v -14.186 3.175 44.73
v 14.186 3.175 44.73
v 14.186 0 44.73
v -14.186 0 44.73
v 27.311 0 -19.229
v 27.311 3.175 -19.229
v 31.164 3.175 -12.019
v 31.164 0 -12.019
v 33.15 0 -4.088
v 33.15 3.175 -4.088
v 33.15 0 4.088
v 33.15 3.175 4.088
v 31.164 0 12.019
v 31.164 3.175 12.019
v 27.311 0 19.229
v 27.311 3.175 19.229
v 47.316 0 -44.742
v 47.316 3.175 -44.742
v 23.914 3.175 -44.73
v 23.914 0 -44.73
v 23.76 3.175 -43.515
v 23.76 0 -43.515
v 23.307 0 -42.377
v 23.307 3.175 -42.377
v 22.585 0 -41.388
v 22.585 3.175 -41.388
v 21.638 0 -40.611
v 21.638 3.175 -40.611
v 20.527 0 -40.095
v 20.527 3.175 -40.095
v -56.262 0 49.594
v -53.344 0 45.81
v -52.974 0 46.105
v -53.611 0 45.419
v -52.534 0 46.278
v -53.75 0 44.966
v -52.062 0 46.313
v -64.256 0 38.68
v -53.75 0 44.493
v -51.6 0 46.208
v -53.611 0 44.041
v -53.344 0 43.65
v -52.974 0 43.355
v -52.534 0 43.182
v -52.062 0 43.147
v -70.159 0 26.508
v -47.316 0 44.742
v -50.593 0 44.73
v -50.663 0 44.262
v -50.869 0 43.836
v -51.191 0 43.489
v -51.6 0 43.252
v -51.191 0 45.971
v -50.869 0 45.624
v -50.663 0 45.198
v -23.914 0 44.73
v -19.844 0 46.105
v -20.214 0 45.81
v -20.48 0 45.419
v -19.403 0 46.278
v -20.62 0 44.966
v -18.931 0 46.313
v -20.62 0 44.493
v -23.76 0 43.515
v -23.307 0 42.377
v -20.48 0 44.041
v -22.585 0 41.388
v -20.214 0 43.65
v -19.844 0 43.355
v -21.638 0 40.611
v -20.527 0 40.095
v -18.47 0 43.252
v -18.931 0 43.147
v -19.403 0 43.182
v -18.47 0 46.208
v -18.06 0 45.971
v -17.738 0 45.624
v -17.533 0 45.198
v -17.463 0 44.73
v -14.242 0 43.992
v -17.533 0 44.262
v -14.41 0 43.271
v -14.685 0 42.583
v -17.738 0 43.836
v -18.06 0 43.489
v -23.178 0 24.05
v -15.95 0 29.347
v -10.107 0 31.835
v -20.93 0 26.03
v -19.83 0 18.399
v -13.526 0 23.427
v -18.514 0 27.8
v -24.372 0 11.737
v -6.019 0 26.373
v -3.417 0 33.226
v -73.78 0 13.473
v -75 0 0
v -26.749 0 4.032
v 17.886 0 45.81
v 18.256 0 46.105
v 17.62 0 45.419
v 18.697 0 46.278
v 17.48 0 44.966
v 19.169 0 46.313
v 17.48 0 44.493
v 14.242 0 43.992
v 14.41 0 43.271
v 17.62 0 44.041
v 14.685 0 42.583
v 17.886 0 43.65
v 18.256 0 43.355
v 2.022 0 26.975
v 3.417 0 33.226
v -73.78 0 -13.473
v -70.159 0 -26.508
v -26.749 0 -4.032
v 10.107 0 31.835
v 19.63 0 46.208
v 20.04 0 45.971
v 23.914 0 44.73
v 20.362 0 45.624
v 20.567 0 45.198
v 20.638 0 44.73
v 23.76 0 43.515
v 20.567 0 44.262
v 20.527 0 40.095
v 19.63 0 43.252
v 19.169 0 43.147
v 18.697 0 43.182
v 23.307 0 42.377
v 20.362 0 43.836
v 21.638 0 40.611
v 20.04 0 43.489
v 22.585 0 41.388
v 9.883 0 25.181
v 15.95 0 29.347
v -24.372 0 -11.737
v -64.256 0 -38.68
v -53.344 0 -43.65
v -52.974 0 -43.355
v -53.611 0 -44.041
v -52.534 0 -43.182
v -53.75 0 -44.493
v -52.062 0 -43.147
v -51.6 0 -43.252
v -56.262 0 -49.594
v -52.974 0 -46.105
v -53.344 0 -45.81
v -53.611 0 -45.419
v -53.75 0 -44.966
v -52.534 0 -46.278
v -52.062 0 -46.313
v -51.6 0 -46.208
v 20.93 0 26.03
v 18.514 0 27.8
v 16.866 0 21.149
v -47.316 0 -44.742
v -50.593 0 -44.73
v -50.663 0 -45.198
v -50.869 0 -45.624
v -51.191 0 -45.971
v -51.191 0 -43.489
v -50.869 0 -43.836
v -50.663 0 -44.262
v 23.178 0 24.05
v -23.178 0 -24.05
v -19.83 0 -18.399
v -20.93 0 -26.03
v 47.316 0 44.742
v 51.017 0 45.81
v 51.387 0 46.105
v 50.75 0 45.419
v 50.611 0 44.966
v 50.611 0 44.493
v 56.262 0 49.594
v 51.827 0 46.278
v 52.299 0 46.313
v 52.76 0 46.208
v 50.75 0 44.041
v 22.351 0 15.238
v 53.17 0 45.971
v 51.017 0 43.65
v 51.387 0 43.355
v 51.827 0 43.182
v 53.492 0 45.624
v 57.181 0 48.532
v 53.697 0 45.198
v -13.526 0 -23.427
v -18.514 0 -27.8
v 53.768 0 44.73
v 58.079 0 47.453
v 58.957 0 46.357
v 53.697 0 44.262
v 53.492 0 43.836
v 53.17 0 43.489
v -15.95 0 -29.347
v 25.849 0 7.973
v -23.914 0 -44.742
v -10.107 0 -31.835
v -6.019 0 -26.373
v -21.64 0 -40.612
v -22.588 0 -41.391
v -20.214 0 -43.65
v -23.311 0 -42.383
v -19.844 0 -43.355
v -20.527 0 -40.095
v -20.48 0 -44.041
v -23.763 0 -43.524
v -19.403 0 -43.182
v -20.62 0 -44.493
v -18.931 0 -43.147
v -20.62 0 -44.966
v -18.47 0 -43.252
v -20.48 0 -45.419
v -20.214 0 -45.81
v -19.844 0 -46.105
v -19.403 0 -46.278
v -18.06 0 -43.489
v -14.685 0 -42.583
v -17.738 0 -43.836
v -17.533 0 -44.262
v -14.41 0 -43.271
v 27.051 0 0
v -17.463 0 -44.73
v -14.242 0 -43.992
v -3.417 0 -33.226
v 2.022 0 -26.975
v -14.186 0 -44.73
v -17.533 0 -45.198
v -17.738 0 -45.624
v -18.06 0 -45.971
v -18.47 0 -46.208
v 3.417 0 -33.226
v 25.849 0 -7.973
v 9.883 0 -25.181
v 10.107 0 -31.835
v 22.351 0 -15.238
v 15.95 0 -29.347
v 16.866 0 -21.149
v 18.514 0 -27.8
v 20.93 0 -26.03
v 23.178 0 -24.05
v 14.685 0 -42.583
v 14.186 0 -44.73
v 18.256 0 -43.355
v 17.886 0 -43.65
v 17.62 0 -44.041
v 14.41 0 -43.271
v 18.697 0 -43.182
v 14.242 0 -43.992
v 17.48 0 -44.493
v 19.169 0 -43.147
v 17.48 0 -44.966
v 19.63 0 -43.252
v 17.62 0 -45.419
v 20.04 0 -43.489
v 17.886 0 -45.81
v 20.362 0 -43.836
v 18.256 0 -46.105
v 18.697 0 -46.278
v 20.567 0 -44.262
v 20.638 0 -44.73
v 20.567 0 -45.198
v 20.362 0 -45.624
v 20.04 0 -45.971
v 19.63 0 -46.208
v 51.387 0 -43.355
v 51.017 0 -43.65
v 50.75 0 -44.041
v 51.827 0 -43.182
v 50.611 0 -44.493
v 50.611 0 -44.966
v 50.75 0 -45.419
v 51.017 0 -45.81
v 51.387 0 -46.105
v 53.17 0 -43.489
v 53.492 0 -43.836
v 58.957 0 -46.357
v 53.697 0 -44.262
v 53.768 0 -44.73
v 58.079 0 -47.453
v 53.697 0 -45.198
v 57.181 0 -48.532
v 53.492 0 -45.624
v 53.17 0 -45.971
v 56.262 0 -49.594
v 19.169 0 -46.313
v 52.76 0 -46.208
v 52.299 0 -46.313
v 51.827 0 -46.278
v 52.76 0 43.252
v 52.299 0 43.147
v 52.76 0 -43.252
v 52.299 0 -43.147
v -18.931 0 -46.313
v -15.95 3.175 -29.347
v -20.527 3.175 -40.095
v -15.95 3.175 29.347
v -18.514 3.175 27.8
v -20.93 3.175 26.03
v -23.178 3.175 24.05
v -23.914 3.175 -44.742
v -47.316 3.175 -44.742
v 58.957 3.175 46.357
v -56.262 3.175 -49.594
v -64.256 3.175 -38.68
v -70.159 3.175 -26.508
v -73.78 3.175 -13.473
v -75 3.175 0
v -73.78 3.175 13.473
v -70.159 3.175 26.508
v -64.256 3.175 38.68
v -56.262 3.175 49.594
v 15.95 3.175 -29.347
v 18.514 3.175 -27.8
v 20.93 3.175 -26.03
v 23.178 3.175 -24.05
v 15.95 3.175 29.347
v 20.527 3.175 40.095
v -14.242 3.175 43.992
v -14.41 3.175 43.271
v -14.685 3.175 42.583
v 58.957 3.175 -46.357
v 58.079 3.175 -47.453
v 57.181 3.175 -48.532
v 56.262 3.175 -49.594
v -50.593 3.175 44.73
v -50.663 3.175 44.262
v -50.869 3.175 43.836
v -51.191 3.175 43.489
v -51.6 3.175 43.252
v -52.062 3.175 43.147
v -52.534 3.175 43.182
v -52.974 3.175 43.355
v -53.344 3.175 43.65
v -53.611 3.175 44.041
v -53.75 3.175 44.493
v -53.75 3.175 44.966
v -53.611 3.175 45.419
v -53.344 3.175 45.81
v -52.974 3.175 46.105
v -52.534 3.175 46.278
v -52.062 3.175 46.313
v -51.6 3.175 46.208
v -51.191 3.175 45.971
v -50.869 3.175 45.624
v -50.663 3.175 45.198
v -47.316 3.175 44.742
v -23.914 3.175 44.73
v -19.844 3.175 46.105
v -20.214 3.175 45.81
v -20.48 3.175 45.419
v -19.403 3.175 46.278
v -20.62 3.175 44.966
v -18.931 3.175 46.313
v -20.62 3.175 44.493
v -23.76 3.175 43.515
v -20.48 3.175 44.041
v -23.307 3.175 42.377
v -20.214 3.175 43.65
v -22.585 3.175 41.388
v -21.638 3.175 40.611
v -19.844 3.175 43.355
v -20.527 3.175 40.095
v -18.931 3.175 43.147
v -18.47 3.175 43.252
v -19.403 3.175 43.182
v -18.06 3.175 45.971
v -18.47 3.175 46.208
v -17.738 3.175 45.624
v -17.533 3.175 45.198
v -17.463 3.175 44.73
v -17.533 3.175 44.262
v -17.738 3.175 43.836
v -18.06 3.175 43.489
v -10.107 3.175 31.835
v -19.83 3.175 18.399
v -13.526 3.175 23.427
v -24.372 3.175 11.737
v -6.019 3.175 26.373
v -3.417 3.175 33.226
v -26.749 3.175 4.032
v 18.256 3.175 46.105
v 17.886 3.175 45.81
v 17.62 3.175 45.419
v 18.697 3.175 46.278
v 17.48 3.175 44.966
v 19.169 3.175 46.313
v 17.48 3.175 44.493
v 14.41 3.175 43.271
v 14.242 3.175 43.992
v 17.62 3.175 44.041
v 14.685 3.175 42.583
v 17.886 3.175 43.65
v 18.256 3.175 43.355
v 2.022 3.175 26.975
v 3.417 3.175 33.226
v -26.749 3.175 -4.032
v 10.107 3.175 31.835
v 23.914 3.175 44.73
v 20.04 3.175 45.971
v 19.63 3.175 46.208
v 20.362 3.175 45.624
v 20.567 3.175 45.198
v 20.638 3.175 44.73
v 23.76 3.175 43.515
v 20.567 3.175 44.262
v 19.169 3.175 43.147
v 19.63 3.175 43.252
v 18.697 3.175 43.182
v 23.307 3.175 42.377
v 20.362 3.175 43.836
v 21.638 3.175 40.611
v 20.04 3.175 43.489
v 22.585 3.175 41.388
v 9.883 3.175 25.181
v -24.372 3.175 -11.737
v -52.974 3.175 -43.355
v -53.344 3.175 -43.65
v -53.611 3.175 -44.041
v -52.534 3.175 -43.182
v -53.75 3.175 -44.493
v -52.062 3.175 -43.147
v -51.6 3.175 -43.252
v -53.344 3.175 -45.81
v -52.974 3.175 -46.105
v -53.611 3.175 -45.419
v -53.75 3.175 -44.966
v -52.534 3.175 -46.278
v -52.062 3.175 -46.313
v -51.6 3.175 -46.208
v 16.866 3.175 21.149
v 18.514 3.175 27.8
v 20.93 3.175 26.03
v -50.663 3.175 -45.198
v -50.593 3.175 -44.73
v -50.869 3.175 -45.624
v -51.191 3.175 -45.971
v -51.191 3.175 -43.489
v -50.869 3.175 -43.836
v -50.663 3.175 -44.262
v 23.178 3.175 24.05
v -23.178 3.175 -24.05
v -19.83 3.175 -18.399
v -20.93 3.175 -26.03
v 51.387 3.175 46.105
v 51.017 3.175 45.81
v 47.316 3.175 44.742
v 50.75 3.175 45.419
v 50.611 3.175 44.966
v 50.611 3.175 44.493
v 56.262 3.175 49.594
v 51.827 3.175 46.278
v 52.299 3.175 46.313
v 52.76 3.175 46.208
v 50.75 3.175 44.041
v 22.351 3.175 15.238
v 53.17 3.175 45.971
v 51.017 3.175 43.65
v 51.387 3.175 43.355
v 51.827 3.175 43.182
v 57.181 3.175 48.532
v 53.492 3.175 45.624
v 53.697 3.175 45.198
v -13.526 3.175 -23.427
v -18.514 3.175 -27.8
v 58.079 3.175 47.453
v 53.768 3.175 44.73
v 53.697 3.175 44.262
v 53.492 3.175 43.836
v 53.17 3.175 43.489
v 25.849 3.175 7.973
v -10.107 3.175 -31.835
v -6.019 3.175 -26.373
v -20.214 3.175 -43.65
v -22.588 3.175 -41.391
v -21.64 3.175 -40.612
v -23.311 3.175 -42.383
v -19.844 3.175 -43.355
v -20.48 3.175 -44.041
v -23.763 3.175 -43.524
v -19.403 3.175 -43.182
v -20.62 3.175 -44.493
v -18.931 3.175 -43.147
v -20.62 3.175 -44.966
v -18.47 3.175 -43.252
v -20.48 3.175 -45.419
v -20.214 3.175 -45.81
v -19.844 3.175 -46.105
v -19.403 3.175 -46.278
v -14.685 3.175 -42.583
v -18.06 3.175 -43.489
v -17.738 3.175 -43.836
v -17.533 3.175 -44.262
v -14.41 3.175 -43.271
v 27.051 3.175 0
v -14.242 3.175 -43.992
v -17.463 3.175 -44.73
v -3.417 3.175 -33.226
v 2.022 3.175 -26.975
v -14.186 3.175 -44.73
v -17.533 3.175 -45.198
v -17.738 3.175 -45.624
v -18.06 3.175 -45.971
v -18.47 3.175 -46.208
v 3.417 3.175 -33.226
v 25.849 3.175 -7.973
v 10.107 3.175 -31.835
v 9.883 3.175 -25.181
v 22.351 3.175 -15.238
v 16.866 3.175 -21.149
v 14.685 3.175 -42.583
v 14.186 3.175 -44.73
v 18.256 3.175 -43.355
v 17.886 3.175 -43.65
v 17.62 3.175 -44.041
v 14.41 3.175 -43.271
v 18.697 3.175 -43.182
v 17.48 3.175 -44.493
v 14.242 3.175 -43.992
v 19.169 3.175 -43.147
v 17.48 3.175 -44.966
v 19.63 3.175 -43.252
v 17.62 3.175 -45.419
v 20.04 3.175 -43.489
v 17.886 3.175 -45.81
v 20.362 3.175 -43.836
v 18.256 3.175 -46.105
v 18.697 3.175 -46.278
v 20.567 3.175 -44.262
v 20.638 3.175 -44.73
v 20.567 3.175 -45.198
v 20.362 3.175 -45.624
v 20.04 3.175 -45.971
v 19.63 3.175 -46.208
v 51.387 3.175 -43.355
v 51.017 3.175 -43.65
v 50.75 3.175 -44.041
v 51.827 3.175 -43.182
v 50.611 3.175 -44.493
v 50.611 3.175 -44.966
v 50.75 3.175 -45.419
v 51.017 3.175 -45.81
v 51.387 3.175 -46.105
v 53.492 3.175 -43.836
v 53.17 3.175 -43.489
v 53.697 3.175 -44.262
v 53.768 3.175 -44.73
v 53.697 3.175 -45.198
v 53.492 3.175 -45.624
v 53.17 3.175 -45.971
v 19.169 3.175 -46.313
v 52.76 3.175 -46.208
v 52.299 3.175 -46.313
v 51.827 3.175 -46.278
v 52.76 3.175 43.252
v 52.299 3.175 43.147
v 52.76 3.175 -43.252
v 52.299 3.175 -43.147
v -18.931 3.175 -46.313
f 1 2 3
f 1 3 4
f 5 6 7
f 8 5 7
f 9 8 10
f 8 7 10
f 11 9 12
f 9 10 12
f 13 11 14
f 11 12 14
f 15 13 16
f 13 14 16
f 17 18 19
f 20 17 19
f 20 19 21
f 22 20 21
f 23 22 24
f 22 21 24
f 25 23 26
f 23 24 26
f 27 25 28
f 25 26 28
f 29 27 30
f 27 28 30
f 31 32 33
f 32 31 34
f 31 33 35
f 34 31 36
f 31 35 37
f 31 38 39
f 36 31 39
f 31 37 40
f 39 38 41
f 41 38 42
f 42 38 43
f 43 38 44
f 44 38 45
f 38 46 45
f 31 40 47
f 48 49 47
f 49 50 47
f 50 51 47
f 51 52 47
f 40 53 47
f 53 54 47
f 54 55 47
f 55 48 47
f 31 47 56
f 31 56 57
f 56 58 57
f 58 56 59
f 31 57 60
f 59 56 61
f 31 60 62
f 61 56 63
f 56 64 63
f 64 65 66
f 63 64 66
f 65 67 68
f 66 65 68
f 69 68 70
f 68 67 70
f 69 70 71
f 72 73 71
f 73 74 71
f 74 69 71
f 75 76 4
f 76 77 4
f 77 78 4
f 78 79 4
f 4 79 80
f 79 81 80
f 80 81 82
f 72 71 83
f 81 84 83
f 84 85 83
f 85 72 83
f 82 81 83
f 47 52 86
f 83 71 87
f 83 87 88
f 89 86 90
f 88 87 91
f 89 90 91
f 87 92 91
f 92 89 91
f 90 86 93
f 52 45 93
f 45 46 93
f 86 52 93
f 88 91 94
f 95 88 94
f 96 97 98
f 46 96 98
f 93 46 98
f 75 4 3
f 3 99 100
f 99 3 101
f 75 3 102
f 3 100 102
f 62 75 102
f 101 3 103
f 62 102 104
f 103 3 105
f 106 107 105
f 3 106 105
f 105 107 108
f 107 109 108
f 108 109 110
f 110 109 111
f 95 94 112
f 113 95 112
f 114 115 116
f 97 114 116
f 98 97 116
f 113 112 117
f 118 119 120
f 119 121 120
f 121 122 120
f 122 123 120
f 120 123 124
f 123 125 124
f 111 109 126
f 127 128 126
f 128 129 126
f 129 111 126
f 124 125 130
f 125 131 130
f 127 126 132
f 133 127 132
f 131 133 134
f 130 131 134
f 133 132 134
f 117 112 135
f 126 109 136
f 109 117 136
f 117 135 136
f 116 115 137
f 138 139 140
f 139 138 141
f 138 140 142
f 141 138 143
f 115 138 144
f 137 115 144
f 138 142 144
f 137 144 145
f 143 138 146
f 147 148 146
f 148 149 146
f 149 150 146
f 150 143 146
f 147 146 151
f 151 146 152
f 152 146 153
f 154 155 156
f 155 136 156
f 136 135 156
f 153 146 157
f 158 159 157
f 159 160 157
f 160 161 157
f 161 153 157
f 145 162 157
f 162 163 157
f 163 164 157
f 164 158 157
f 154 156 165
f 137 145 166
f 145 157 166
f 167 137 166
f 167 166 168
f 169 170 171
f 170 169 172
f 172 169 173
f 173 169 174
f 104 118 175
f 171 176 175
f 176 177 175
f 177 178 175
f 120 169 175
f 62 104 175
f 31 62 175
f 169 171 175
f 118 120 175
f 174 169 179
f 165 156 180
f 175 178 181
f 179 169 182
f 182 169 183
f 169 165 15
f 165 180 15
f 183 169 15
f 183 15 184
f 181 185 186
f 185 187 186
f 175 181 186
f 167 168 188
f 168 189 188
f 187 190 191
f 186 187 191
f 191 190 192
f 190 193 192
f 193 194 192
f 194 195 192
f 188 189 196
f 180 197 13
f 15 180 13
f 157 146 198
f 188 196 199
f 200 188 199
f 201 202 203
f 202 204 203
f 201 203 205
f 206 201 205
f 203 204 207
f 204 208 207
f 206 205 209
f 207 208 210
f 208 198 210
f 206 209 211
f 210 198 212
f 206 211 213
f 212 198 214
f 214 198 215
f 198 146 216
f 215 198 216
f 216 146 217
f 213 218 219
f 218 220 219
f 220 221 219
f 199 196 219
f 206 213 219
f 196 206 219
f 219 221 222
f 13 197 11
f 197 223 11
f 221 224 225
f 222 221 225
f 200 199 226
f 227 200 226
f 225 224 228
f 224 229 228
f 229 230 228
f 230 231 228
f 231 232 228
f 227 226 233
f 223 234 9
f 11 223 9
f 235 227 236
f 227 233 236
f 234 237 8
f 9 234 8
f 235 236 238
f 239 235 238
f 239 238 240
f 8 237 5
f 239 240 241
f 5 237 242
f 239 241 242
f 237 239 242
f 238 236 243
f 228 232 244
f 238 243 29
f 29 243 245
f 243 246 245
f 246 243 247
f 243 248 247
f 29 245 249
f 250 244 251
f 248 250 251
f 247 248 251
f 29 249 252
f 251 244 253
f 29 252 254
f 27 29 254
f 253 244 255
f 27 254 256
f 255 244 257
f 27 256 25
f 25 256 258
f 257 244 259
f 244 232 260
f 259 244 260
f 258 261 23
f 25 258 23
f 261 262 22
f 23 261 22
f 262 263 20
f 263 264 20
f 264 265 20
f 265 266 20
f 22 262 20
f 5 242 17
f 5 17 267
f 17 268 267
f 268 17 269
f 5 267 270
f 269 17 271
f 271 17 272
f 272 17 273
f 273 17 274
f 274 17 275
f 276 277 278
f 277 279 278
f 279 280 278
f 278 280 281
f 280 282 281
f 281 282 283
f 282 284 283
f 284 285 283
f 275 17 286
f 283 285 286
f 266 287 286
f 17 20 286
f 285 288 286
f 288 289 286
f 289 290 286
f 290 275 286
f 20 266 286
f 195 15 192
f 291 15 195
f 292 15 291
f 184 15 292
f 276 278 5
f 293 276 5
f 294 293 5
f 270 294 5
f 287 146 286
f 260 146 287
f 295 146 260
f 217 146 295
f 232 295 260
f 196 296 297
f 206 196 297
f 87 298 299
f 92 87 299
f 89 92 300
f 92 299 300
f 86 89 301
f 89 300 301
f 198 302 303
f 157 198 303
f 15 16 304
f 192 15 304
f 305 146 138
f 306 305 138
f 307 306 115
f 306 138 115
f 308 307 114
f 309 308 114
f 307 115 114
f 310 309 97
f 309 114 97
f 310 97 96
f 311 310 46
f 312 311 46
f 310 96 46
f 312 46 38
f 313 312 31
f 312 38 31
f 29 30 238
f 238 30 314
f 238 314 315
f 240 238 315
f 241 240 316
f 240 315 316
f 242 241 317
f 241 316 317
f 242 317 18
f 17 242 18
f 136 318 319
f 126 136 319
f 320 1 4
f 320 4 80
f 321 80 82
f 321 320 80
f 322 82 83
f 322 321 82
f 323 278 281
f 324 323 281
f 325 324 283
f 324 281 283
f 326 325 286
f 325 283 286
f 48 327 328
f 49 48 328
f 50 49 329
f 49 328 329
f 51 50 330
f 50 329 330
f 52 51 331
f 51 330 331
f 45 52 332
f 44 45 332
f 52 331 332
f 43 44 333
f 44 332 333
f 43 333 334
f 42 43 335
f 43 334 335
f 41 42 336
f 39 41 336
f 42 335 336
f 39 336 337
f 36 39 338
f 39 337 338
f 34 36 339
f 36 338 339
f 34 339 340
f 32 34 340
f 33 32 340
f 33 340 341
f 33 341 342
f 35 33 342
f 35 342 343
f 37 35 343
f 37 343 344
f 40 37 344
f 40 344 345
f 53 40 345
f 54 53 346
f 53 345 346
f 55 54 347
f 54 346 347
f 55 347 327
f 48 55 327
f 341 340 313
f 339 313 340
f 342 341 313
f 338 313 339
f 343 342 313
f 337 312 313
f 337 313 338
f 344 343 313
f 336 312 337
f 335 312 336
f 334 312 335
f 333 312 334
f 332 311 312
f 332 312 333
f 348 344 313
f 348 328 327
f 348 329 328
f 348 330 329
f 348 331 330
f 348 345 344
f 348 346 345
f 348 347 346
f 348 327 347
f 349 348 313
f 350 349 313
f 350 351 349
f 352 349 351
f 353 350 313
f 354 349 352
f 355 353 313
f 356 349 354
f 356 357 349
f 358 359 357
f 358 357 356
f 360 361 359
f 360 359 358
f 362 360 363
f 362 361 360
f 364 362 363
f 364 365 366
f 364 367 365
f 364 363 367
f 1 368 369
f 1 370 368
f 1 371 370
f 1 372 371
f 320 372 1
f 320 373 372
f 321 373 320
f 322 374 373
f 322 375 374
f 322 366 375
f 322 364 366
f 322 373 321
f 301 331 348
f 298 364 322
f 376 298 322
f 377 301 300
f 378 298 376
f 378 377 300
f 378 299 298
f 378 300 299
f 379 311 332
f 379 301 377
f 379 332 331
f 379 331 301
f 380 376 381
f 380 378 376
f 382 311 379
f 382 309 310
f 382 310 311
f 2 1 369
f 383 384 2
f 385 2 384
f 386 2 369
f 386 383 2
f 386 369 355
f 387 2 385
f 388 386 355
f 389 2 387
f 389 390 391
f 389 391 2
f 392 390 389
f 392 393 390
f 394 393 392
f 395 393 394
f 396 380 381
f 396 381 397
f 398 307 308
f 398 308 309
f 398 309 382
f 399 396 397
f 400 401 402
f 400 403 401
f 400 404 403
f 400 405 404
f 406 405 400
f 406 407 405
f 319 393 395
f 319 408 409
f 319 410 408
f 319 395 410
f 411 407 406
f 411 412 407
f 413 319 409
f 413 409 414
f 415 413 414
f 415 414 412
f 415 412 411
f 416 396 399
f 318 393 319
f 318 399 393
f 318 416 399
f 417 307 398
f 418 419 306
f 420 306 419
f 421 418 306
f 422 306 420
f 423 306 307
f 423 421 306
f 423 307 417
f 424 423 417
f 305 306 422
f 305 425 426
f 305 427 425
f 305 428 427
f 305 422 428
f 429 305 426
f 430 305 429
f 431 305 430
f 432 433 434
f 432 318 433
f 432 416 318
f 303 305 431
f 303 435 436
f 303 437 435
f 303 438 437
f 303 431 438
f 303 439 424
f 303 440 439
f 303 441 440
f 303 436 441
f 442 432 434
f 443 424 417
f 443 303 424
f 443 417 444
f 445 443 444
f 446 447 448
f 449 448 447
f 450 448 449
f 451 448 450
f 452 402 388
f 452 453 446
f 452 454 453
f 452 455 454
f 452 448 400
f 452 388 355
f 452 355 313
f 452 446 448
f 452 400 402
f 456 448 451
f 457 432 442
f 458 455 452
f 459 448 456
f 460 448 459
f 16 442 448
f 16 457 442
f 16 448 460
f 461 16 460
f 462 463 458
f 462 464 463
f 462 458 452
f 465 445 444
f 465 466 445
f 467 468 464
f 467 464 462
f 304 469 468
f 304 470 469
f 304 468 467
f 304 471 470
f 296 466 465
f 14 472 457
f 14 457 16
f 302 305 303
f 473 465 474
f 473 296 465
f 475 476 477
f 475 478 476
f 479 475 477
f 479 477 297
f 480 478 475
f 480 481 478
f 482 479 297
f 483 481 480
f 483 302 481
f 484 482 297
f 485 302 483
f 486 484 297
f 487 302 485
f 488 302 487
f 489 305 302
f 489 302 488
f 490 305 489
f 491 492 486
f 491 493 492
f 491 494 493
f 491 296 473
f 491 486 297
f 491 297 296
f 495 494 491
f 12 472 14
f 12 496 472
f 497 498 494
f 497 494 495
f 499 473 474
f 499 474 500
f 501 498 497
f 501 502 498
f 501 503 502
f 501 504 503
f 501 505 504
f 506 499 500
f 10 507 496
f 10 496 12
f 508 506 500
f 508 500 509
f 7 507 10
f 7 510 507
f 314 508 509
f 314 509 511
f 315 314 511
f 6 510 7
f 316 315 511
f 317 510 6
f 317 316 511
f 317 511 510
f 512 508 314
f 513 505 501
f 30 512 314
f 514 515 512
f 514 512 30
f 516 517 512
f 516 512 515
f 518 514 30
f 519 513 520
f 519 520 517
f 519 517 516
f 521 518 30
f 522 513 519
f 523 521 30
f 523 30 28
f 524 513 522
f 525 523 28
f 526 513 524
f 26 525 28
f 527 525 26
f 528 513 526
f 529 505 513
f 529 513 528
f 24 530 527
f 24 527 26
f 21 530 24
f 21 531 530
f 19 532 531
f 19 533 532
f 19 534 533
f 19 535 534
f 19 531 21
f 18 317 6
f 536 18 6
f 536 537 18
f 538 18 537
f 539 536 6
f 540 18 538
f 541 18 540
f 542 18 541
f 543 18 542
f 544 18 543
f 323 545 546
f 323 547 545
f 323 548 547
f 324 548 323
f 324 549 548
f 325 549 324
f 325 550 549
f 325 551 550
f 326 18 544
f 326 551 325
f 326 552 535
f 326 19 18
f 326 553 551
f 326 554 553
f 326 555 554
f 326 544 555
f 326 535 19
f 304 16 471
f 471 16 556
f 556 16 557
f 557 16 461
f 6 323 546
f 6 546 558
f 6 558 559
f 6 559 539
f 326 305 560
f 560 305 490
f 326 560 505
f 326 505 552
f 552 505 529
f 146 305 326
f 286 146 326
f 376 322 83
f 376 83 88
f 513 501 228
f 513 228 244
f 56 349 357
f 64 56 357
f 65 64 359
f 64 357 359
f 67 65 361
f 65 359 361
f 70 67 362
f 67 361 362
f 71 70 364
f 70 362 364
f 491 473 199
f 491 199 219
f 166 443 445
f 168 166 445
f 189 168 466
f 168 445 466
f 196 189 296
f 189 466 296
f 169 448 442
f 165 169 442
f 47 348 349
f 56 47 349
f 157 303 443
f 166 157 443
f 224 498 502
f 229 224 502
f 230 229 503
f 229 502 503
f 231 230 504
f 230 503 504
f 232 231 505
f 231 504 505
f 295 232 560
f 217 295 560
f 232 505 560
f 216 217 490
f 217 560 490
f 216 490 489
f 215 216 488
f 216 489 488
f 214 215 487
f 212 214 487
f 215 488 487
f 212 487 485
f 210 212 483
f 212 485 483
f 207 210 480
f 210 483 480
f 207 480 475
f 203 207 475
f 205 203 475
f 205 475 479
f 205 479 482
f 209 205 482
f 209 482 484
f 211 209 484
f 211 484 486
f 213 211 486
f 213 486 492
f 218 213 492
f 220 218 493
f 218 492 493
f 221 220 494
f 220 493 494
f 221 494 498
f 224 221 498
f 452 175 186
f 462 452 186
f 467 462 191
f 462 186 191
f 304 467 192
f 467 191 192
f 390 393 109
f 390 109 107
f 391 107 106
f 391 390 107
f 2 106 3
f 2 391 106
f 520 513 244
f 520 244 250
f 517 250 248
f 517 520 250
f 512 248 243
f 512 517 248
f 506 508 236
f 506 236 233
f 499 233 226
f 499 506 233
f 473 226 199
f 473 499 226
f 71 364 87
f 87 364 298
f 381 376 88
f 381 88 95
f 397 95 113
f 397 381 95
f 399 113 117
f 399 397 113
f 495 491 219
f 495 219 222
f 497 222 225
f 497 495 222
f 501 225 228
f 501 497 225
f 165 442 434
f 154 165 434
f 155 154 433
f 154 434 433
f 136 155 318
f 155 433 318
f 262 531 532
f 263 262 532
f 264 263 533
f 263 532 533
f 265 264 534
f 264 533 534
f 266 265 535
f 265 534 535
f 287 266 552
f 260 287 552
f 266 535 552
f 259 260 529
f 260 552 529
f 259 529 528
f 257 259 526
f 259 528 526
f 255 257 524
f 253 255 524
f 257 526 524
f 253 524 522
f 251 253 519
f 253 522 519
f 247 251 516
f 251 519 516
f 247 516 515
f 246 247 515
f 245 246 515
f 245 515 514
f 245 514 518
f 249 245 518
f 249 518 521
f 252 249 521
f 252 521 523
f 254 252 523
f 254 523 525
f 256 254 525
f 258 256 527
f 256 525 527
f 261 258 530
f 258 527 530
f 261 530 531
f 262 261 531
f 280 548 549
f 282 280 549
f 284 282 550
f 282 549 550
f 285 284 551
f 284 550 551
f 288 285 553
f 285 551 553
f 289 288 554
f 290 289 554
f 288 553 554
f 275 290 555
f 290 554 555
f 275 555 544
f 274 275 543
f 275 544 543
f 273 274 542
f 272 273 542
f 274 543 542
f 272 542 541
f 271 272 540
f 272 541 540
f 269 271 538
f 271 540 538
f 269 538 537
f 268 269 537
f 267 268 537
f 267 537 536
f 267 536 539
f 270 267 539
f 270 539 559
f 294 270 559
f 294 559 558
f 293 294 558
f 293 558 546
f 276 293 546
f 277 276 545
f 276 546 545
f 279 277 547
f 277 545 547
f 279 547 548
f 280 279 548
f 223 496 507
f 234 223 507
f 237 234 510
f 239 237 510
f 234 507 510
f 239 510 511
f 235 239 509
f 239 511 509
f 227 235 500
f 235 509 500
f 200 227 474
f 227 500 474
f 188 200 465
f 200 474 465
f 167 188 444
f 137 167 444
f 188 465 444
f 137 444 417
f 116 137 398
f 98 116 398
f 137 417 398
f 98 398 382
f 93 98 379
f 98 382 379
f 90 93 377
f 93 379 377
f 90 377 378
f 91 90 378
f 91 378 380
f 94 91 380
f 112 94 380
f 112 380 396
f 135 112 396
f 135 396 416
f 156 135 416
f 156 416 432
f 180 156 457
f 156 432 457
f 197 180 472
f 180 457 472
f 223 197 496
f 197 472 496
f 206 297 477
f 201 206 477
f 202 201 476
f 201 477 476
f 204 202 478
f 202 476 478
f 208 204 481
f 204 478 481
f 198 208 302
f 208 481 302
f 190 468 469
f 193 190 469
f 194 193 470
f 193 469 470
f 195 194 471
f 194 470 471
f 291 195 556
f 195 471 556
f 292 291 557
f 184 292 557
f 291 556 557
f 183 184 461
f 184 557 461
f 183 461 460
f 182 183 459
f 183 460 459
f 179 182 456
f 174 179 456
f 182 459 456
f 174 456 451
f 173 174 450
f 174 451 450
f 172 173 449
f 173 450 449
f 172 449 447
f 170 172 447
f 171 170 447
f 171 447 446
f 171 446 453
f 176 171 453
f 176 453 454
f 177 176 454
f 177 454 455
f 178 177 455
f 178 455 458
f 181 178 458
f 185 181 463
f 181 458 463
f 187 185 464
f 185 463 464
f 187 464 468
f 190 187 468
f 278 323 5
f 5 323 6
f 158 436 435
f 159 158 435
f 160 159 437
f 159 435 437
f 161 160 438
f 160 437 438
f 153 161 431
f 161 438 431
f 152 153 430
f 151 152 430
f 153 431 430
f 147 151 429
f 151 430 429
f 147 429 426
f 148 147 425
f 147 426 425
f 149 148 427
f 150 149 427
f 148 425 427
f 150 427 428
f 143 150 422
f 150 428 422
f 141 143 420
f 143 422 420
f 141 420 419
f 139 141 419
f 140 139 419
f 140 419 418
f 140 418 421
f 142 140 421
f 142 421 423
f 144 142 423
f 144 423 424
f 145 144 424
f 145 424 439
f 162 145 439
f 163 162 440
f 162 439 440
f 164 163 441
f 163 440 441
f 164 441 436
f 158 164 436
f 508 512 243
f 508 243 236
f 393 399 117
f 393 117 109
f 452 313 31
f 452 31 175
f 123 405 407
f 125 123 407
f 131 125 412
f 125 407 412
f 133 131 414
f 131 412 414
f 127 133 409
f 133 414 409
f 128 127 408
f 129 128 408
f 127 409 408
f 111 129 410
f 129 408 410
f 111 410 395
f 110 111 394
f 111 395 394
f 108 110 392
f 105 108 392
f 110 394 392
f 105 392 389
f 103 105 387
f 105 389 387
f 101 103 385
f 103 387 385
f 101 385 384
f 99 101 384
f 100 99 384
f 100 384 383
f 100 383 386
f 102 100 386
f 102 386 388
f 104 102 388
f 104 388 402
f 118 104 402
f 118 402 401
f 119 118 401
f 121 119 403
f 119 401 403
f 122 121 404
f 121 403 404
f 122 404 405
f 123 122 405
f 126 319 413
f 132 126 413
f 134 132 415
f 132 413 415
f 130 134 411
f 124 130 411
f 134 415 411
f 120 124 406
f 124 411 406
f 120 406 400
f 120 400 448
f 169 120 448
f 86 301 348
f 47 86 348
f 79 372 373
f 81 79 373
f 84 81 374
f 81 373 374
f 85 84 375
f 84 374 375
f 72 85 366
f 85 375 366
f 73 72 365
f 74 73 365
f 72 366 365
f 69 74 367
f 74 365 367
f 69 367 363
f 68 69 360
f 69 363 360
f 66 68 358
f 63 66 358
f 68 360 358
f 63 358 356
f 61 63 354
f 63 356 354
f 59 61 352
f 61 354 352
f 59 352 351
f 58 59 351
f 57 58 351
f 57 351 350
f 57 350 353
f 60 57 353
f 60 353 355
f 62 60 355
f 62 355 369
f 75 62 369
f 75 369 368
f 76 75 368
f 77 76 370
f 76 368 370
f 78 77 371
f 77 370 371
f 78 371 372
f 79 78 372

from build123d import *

# Parameters (mm, degrees)
SKETCH1_R           = 75
BOSS_EXTRUDE1_DEPTH = 3.175
CUT_EXTRUDE1_DEPTH  = 3.175
SKETCH3_R           = 1.5875
CUT_EXTRUDE2_DEPTH  = 3.175
SKETCH4_R           = 27.051
CUT_EXTRUDE3_DEPTH  = 3.175
CUT_EXTRUDE4_DEPTH  = 3.175


with BuildPart() as part:
    # Sketch1 → Boss-Extrude1 (new body)
    with BuildSketch(Plane(origin=(0, 0, 0), x_dir=(1, 0, 0), z_dir=(0, 1, 0))):
        Circle(SKETCH1_R)
    extrude(amount=BOSS_EXTRUDE1_DEPTH)

    # Sketch2 → Cut-Extrude1 (cut)
    with BuildSketch(Plane(origin=(0, 3.175, 0), x_dir=(1, 0, 0), z_dir=(0, 1, 0))):
        with BuildLine():
            Line((-56.262005909, -49.594220339), (56.262005909, -49.594220339))
            ThreePointArc((56.262005909, -49.594220339), (0, -75), (-56.262005909, -49.594220339))
        make_face()
        with BuildLine():
            Line((-56.262005909, 49.594220339), (56.262005909, 49.594220339))
            ThreePointArc((56.262005909, 49.594220339), (0, 75), (-56.262005909, 49.594220339))
        make_face()
    extrude(amount=-CUT_EXTRUDE1_DEPTH, mode=Mode.SUBTRACT)

    # Sketch3 → Cut-Extrude2 (cut)
    with BuildSketch(Plane(origin=(0, 3.175, 0), x_dir=(1, 0, 0), z_dir=(0, 1, 0))):
        with Locations((-52.180304588, 44.729838125)):
            Circle(SKETCH3_R)
        with Locations((-19.05, 44.729838125)):
            Circle(SKETCH3_R)
        with Locations((19.05, 44.729838125)):
            Circle(SKETCH3_R)
        with Locations((52.180304588, 44.729838125)):
            Circle(SKETCH3_R)
        with Locations((52.180304588, -44.729838125)):
            Circle(SKETCH3_R)
        with Locations((19.05, -44.729838125)):
            Circle(SKETCH3_R)
        with Locations((-19.05, -44.729838125)):
            Circle(SKETCH3_R)
        with Locations((-52.180304588, -44.729838125)):
            Circle(SKETCH3_R)
    extrude(amount=-CUT_EXTRUDE2_DEPTH, mode=Mode.SUBTRACT)

    # Sketch4 → Cut-Extrude3 (cut)
    with BuildSketch(Plane(origin=(0, 3.175, 0), x_dir=(1, 0, 0), z_dir=(0, 1, 0))):
        with BuildLine():
            Line((-47.315937317, 44.741895283), (-23.177806764, 24.050282215))
            ThreePointArc((-23.177806764, 24.050282215), (-19.742091457, 26.942097653), (-15.949506316, 29.346891646))
            Line((-15.949506316, 29.346891646), (-20.527078848, 40.095137229))
            ThreePointArc((-20.527078848, 40.095137229), (-22.980849122, 41.864416778), (-23.914367271, 44.741895283))
            Line((-23.914367271, 44.741895283), (-47.315937317, 44.741895283))
        make_face()
        with BuildLine():
            ThreePointArc((10.107278818, 31.835039122), (0, 33.401), (-10.107278818, 31.835039122))
            Line((-10.107278818, 31.835039122), (-14.68485135, 42.583284705))
            ThreePointArc((-14.68485135, 42.583284705), (-14.312069768, 43.627916425), (-14.185617786, 44.729838125))
            Line((-14.185617786, 44.729838125), (14.185617786, 44.729838125))
            ThreePointArc((14.185617786, 44.729838125), (14.312069768, 43.627916425), (14.68485135, 42.583284705))
            Line((14.68485135, 42.583284705), (10.107278818, 31.835039122))
        make_face()
        with BuildLine():
            ThreePointArc((15.949506316, 29.346891646), (19.742091457, 26.942097653), (23.177806764, 24.050282215))
            Line((23.177806764, 24.050282215), (47.315937317, 44.741895283))
            Line((47.315937317, 44.741895283), (23.914382214, 44.729838125))
            ThreePointArc((23.914382214, 44.729838125), (22.977294896, 41.859547352), (20.527078848, 40.095137229))
            Line((20.527078848, 40.095137229), (15.949506316, 29.346891646))
        make_face()
        Circle(SKETCH4_R)
        with BuildLine():
            Line((-23.177806764, -24.050282215), (-47.315937317, -44.741895283))
            Line((-47.315937317, -44.741895283), (-23.914382214, -44.729838125))
            ThreePointArc((-23.914382214, -44.729838125), (-22.977294896, -41.859547352), (-20.527078848, -40.095137229))
            Line((-20.527078848, -40.095137229), (-15.949506316, -29.346891646))
            ThreePointArc((-15.949506316, -29.346891646), (-19.742091457, -26.942097653), (-23.177806764, -24.050282215))
        make_face()
        with BuildLine():
            ThreePointArc((-10.107278818, -31.835039122), (0, -33.401), (10.107278818, -31.835039122))
            Line((10.107278818, -31.835039122), (14.68485135, -42.583284705))
            ThreePointArc((14.68485135, -42.583284705), (14.312069768, -43.627916425), (14.185617786, -44.729838125))
            Line((14.185617786, -44.729838125), (-14.185617786, -44.729838125))
            ThreePointArc((-14.185617786, -44.729838125), (-14.312069768, -43.627916425), (-14.68485135, -42.583284705))
            Line((-14.68485135, -42.583284705), (-10.107278818, -31.835039122))
        make_face()
        with BuildLine():
            ThreePointArc((23.177806764, -24.050282215), (19.742091457, -26.942097653), (15.949506316, -29.346891646))
            Line((15.949506316, -29.346891646), (20.527078848, -40.095137229))
            ThreePointArc((20.527078848, -40.095137229), (22.977294896, -41.859547352), (23.914382214, -44.729838125))
            Line((23.914382214, -44.729838125), (47.315937317, -44.741895283))
            Line((47.315937317, -44.741895283), (23.177806764, -24.050282215))
        make_face()
    extrude(amount=-CUT_EXTRUDE3_DEPTH, mode=Mode.SUBTRACT)

    # Sketch5 → Cut-Extrude4 (cut)
    with BuildSketch(Plane(origin=(0, 3.175, 0), x_dir=(1, 0, 0), z_dir=(0, 1, 0))):
        with BuildLine():
            Line((58.957481542, 46.357473725), (27.31053772, 19.229179141))
            ThreePointArc((27.31053772, 19.229179141), (33.401, 0), (27.31053772, -19.229179141))
            Line((27.31053772, -19.229179141), (58.957481542, -46.357473725))
            ThreePointArc((58.957481542, -46.357473725), (75, 0), (58.957481542, 46.357473725))
        make_face()
    extrude(amount=-CUT_EXTRUDE4_DEPTH, mode=Mode.SUBTRACT)


solid = part.part
